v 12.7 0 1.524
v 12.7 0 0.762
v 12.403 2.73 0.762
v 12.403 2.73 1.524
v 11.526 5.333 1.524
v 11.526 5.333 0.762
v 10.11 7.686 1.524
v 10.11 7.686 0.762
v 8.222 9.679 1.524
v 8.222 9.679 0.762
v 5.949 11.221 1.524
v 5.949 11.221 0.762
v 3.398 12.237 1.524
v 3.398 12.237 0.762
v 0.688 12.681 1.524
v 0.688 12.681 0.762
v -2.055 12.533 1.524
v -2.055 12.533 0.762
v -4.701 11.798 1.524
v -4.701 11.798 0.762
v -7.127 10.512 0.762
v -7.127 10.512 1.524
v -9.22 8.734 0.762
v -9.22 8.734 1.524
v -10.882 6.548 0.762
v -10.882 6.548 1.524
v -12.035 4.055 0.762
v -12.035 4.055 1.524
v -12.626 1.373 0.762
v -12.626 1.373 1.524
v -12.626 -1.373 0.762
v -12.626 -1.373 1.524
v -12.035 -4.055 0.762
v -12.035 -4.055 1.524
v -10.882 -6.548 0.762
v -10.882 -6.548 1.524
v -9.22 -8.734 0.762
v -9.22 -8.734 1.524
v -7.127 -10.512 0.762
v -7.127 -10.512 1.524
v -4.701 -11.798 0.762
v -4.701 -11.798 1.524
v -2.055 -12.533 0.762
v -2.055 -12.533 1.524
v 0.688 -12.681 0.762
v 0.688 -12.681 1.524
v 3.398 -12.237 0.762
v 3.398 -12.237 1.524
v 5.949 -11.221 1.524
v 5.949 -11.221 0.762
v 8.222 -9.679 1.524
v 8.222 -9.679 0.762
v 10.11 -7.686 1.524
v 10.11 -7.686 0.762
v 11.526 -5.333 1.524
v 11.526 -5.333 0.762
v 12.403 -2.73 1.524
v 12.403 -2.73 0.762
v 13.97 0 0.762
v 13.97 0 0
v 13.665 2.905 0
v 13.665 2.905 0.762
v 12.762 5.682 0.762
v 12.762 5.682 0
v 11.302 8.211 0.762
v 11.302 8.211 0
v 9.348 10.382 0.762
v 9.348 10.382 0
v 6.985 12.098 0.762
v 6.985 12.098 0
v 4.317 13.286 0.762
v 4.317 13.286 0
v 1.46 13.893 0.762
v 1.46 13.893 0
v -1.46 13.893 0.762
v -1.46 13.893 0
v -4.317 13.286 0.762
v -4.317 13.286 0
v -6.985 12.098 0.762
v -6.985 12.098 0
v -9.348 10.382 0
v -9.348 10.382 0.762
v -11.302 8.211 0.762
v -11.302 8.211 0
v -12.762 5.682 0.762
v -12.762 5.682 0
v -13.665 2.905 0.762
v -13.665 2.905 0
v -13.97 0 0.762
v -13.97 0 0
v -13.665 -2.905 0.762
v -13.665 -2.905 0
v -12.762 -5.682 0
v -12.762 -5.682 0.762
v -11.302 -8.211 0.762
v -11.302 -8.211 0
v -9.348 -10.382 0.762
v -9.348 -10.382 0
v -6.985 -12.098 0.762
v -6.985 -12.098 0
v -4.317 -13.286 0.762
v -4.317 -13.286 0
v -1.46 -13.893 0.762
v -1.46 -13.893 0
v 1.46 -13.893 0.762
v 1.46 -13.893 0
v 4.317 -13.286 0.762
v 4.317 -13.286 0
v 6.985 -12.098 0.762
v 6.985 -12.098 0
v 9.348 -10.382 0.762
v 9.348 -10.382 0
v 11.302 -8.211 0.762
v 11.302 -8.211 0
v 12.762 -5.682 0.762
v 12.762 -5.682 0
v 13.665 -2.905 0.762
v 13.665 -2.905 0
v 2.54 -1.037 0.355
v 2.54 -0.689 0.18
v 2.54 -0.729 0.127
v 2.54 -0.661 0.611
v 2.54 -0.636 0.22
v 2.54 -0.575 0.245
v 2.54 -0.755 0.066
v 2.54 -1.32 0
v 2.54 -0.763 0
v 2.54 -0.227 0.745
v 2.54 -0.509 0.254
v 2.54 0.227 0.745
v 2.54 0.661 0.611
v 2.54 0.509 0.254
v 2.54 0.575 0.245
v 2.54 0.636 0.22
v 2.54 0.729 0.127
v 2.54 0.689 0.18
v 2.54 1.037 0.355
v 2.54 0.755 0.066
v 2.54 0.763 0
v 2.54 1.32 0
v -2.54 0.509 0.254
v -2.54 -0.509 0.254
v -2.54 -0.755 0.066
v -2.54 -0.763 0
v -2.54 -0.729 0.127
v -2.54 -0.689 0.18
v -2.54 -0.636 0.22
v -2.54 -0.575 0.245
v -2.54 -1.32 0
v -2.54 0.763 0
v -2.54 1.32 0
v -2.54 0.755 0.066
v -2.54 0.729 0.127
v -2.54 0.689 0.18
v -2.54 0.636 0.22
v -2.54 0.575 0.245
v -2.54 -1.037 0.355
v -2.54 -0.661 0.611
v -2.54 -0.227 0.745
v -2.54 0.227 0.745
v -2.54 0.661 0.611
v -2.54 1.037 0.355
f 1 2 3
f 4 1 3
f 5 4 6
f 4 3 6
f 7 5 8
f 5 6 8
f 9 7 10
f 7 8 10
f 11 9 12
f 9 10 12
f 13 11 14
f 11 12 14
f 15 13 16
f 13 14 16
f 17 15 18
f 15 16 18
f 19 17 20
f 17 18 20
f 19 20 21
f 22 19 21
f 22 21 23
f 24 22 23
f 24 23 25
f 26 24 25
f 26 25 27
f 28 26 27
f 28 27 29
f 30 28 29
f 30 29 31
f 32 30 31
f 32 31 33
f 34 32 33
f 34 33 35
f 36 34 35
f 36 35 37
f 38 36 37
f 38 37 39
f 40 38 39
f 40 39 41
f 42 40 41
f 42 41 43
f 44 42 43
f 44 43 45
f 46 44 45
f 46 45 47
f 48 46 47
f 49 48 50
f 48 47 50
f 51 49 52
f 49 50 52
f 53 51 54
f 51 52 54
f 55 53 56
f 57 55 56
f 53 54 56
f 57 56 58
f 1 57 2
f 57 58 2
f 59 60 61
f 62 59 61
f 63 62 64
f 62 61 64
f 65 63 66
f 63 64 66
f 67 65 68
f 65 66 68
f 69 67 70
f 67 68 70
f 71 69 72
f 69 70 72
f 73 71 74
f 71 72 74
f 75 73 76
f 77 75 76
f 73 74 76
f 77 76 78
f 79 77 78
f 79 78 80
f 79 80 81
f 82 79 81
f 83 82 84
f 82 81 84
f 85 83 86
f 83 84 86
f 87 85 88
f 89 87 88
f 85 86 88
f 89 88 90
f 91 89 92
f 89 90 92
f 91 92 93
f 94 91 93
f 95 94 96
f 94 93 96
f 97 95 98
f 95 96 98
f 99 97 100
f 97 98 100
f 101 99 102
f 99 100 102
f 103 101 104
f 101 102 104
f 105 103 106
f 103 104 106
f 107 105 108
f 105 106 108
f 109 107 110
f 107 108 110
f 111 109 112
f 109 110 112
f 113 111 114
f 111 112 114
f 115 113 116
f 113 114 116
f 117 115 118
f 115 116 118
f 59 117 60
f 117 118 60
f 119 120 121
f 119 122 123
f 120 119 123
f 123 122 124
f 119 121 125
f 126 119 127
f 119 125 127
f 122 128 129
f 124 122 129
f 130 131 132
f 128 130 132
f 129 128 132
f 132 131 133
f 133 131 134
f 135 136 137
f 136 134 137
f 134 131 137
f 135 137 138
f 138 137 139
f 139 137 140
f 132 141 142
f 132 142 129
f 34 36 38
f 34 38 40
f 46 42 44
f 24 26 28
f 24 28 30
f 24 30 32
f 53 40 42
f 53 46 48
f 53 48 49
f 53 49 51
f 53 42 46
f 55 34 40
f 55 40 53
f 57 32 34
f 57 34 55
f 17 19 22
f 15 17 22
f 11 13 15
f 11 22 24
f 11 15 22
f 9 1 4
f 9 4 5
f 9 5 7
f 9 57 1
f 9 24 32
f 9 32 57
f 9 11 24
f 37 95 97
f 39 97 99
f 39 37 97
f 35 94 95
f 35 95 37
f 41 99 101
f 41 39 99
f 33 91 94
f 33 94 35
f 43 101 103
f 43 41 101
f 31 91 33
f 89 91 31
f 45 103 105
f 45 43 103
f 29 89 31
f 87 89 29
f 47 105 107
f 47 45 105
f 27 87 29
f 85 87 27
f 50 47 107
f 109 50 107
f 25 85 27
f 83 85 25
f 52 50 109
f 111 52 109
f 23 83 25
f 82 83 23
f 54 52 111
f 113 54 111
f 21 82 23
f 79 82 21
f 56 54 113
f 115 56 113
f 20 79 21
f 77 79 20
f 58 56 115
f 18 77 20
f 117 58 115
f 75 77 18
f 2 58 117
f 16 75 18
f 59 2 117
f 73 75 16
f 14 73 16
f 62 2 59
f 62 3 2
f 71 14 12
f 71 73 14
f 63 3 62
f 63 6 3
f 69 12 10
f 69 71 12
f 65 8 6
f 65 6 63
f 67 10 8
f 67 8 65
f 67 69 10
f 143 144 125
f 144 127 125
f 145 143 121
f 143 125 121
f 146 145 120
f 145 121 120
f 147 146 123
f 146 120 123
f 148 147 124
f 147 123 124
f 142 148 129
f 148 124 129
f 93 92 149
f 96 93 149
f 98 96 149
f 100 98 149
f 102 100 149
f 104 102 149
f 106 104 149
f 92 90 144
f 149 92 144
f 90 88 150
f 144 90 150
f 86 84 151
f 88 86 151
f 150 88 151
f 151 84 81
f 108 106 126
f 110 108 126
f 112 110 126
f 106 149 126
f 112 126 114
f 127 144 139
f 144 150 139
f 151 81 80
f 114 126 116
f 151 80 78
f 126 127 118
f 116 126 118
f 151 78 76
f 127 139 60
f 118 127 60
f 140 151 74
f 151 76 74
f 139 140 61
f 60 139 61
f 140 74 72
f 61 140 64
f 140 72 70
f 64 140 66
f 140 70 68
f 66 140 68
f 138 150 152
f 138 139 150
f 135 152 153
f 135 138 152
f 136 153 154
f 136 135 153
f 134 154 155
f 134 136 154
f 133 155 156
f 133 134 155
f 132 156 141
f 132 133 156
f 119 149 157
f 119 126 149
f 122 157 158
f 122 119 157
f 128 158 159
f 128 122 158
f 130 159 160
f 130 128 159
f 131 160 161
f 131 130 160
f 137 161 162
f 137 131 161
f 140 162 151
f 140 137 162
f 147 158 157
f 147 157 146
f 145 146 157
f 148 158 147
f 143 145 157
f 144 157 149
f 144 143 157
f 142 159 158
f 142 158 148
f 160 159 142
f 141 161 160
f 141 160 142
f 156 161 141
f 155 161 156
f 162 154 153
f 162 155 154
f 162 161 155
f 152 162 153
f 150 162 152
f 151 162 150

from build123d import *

# Parameters (mm, degrees)
F0_R     = 12.7
F1_DEPTH = 1.524
F2_R     = 13.97
F3_DEPTH = 0.762
F4_W     = 5.08
F4_H     = 1.524
F6_W     = 5.08000508
F6_H     = 1.5265774739
F7_DEPTH = 0.254
F8_R     = 0.25399


# Not quite as in the source:
# - a fillet or chamfer is up to 0.001 mm smaller than in the source, because OpenCascade refuses the exact size


with BuildPart() as f1:
    # F0 (on Top) → F1 (new body)
    with BuildSketch(Plane.XY):
        Circle(F0_R)
    extrude(amount=F1_DEPTH)

    # F2 (on Top) → F3 (join)
    with BuildSketch(Plane.XY):
        Circle(F2_R)
    extrude(amount=F3_DEPTH)

    # F4 (on Front) → F5 (revolve, cut)
    with BuildSketch(Plane.XZ):
        Rectangle(F4_W, F4_H)
    revolve(axis=Axis((0, 0, -0.762), (-1, 0, 0)), mode=Mode.SUBTRACT)

    # F6 (on Top) → F7 (join)
    with BuildSketch(Plane.XY):
        Rectangle(F6_W, F6_H)
    extrude(amount=F7_DEPTH)

    # F8 (radius 0.254 in the source; OpenCascade refuses exactly that, so slightly less here)
    f8_edges = [f1.edges().sort_by_distance(p)[0] for p in [
        (0, 0.763289, 0.254),
        (0, -0.763289, 0.254),
    ]]
    fillet(f8_edges, radius=F8_R)


solid = f1.part
